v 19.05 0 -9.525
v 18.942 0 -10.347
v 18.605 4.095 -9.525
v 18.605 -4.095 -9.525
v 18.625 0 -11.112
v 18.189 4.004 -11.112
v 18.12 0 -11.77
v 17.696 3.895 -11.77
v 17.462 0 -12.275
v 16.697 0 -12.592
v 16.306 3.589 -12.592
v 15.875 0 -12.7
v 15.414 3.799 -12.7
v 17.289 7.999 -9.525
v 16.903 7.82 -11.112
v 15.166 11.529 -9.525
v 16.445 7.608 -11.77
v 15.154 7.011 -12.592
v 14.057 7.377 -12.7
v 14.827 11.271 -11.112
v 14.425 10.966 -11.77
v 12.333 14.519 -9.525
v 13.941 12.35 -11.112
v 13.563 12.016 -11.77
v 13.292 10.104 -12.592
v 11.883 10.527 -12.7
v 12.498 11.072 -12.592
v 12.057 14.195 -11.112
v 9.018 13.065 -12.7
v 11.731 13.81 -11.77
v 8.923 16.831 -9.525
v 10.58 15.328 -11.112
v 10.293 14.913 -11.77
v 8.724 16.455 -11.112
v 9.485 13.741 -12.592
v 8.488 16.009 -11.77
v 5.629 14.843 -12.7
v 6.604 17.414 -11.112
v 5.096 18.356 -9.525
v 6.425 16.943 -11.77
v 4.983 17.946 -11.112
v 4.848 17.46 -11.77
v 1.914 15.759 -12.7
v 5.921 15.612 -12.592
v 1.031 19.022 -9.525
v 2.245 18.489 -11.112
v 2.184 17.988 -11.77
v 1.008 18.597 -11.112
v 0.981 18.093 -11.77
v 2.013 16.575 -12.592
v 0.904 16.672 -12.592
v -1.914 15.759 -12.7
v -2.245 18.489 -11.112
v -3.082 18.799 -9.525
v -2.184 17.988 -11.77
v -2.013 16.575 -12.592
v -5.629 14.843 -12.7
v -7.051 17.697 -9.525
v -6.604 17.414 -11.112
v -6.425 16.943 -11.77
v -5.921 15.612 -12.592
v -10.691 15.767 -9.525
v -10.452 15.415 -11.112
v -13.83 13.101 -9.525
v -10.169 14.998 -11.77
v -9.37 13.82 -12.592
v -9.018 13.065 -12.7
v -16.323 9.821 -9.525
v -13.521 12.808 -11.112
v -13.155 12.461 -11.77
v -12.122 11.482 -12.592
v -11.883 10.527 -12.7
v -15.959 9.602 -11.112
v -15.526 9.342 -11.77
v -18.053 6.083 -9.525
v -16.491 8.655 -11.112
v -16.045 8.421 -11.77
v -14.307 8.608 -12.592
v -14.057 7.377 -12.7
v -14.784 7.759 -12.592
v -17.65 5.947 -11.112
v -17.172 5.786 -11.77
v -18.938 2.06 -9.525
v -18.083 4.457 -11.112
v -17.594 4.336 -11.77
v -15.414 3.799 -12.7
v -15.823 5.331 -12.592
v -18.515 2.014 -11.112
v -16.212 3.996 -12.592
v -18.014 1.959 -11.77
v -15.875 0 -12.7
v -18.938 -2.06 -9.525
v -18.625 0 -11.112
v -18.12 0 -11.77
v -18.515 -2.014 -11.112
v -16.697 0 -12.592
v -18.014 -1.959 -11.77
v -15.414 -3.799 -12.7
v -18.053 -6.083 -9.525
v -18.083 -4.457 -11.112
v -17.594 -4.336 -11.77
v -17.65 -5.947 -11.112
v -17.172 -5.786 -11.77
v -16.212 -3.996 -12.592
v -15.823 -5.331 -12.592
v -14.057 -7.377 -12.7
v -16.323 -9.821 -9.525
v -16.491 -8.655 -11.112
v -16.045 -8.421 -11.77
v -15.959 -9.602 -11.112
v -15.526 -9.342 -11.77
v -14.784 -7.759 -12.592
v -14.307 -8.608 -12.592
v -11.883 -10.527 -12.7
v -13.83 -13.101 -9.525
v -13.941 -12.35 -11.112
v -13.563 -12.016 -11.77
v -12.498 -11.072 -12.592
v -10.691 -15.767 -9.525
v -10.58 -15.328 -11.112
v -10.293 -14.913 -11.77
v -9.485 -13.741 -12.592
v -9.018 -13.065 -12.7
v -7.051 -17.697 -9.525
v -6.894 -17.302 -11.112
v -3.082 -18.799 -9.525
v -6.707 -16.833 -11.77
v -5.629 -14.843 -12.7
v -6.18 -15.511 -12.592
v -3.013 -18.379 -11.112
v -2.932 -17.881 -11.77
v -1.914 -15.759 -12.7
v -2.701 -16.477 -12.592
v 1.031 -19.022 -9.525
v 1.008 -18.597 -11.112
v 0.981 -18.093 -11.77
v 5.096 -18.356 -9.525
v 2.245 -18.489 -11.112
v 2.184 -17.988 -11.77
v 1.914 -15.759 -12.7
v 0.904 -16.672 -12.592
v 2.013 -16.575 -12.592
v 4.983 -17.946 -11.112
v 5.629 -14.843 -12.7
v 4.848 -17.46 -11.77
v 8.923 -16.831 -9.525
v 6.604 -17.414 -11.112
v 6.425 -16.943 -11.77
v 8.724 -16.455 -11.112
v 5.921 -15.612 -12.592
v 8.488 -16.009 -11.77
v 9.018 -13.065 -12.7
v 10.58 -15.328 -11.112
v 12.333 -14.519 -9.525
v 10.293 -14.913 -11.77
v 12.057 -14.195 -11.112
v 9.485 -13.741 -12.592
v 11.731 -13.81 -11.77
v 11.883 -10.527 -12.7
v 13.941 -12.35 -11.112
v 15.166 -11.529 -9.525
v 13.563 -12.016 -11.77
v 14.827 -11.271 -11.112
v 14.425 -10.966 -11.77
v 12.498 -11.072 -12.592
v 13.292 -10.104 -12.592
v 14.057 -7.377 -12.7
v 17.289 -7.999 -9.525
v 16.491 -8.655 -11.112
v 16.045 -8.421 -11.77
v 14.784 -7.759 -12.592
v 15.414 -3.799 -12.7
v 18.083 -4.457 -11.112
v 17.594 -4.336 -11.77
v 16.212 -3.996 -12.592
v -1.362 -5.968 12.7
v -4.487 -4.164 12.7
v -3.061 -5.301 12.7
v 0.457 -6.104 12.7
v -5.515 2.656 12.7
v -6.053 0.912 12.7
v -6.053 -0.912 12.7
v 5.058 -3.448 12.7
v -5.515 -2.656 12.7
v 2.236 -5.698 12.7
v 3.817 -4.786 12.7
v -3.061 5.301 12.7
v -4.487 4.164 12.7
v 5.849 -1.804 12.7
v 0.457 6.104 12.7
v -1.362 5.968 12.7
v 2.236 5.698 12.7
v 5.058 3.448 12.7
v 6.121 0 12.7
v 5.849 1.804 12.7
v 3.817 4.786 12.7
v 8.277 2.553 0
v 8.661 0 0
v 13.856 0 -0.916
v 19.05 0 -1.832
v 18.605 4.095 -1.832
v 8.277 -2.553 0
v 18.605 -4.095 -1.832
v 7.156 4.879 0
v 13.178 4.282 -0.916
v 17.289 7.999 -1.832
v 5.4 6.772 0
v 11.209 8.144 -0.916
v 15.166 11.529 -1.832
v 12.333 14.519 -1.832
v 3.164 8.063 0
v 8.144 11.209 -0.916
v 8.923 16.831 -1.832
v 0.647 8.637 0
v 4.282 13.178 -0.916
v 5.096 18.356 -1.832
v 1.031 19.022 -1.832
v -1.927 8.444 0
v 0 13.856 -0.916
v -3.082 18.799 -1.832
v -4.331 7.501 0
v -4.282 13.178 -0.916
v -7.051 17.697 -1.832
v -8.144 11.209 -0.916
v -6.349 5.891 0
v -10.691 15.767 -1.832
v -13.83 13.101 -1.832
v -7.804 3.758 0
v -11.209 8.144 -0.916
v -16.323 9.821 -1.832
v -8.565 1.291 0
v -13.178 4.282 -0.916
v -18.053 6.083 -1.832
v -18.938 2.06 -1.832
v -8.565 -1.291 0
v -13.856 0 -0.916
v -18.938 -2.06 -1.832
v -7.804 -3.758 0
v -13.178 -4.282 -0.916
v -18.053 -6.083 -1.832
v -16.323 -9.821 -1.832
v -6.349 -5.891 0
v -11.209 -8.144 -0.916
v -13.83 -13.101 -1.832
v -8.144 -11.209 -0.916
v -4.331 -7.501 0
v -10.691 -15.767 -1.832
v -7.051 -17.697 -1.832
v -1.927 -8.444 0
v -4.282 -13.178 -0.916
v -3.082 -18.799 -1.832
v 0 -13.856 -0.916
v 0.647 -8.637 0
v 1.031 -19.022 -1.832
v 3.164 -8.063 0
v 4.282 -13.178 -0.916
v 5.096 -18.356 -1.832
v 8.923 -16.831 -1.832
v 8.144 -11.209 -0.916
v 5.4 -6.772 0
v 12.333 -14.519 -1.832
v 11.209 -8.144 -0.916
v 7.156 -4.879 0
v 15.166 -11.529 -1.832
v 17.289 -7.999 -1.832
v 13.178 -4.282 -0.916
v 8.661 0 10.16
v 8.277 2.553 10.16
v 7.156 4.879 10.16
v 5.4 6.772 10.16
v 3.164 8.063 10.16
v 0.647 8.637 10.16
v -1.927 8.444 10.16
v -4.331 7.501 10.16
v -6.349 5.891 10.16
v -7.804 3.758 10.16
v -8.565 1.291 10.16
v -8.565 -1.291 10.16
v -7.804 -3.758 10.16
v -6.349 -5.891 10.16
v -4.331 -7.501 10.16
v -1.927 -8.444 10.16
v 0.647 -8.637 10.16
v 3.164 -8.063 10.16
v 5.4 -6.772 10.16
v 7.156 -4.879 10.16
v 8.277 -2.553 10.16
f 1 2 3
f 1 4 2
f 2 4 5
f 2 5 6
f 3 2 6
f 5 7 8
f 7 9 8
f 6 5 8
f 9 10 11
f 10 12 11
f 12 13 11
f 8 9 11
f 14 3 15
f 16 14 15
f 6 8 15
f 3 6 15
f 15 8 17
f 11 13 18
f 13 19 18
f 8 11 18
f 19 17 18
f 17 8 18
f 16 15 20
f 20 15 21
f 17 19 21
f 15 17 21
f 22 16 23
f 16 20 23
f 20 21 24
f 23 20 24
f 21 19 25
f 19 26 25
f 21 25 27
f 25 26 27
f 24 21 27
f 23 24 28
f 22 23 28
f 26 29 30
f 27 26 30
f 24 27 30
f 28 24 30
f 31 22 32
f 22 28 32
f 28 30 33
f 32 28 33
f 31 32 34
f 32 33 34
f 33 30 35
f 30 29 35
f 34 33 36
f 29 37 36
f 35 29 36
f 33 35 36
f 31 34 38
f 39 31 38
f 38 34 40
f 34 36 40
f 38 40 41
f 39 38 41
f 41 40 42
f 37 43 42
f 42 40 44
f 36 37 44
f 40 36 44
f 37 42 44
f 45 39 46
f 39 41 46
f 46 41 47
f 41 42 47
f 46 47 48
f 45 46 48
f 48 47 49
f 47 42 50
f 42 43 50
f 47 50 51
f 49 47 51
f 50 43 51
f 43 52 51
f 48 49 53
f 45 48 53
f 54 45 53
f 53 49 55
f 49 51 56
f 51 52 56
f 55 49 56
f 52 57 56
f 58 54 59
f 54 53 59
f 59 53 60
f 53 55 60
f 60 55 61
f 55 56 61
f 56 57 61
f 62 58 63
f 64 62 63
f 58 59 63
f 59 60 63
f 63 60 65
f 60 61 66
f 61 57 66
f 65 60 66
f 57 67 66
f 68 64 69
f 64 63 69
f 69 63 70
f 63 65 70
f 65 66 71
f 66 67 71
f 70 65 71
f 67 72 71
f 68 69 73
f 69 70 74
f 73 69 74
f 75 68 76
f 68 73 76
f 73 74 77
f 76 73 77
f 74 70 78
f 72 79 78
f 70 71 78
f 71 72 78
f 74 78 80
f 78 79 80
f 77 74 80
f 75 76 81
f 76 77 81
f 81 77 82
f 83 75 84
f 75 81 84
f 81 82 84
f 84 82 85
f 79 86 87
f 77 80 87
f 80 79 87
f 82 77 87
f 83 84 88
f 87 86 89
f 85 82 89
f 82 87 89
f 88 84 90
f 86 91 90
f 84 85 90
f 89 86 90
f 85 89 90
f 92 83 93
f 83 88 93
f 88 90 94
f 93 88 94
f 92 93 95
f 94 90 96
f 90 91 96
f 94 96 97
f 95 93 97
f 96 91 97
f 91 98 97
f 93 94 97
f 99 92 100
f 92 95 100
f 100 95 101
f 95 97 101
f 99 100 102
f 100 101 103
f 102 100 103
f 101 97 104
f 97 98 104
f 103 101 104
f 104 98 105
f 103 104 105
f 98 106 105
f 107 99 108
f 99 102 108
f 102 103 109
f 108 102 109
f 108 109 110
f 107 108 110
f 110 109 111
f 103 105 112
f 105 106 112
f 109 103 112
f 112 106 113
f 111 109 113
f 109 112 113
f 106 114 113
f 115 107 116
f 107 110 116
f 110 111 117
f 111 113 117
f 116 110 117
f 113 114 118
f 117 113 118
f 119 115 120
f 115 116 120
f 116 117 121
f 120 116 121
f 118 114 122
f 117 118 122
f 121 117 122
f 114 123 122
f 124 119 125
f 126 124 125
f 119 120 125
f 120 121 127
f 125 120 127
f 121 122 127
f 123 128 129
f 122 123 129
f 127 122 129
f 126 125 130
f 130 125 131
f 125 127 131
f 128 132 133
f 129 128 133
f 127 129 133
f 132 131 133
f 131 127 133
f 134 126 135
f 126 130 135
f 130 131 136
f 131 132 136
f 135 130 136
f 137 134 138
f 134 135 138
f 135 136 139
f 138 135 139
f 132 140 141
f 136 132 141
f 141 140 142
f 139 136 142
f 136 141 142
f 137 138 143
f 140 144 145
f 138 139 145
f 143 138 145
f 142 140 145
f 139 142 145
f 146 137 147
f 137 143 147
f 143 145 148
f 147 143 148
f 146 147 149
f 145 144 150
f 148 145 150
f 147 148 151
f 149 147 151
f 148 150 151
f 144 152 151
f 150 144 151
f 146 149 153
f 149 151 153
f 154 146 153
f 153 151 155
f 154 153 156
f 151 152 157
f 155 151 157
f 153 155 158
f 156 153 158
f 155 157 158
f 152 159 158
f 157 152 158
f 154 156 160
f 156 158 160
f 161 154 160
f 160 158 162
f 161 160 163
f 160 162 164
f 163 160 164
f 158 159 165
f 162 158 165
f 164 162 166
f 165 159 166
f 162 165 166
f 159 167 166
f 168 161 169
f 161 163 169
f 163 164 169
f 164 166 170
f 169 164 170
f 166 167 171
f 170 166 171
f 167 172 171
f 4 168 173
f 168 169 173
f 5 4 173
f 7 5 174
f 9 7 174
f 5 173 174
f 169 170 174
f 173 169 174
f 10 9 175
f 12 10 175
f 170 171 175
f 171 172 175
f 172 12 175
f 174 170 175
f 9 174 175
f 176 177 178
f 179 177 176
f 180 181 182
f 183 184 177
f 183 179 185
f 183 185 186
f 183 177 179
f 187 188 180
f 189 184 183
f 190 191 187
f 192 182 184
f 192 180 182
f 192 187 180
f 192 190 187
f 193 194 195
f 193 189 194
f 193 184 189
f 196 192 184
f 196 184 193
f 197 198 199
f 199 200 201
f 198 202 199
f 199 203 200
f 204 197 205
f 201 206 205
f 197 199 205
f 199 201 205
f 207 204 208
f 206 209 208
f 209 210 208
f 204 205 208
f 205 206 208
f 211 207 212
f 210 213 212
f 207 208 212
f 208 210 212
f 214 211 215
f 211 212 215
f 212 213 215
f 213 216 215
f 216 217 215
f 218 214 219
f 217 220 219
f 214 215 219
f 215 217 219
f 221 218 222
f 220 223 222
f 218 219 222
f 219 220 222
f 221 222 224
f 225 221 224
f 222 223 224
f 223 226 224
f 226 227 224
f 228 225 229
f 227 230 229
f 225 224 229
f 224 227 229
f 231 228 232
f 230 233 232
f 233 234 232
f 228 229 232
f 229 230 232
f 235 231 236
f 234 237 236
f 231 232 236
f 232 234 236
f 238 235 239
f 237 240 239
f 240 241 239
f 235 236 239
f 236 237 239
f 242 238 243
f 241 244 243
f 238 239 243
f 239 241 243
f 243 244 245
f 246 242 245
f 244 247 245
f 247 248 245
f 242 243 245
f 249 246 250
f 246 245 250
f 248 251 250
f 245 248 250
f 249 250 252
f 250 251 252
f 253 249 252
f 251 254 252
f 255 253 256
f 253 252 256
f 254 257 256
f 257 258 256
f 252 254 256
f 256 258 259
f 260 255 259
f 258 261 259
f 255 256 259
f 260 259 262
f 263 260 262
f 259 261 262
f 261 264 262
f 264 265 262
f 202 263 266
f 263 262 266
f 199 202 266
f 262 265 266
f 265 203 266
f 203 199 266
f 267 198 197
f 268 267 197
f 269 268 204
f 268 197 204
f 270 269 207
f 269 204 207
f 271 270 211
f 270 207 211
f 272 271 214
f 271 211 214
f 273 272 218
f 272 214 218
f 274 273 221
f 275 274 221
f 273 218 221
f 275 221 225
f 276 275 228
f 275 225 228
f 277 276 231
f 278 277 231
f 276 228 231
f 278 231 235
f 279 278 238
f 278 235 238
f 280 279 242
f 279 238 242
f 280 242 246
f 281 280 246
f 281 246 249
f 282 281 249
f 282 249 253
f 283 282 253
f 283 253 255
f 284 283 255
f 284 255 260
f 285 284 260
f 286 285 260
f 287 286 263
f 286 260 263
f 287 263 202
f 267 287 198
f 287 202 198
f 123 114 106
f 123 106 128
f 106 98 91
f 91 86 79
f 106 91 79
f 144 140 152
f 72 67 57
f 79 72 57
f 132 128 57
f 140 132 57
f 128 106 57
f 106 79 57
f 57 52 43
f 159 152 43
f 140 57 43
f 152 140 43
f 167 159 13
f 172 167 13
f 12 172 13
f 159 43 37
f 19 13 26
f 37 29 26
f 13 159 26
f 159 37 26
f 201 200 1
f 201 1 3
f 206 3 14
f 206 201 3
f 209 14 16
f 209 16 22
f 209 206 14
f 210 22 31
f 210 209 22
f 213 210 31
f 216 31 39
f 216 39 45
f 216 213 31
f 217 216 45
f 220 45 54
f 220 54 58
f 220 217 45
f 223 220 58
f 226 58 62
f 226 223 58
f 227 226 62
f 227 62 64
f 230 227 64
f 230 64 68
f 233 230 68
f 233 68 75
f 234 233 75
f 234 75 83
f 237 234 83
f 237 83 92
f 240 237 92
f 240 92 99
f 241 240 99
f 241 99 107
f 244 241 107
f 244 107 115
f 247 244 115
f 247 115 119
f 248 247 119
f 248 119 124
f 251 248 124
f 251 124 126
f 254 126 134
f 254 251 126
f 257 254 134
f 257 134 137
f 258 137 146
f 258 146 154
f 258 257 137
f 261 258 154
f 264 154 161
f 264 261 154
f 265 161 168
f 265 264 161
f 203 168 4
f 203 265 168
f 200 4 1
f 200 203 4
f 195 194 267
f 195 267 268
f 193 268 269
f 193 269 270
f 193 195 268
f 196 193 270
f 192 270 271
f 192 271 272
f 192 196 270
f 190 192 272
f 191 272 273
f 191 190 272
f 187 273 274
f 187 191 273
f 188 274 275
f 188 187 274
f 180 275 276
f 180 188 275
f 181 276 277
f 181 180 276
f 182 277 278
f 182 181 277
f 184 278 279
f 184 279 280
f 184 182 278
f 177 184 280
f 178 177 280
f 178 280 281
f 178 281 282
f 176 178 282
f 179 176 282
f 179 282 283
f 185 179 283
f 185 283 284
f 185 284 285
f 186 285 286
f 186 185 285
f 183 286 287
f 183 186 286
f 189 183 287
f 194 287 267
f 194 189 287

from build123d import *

# Parameters (mm, degrees)
F0_R     = 19.05
F1_DEPTH = 12.7
F2_R     = 8.6614
F3_DEPTH = 12.7
F4_SIZE  = 2.54
F7_R     = 3.175


with BuildPart() as f1:
    # F0 (on Top) → F1 (new body)
    with BuildSketch(Plane.XY):
        Circle(F0_R)
    extrude(amount=-F1_DEPTH)

    # F2 (on face) → F3 (join)
    with BuildSketch(Plane.XY):
        Circle(F2_R)
    extrude(amount=F3_DEPTH)

    # F4
    f4_edges = [f1.edges().sort_by_distance(p)[0] for p in [
        (-8.6614, 0, 12.7),
    ]]
    chamfer(f4_edges, length=F4_SIZE)

    # F5 (on Front) → F6 (revolve, cut)
    with BuildSketch(Plane.XZ):
        Polygon((19.05, -1.83179), (19.05, 0), (8.6614, 0), align=None)
    revolve(axis=Axis((0, 0, 4.455826), (0, 0, 1)), mode=Mode.SUBTRACT)

    # F7
    f7_edges = [f1.edges().sort_by_distance(p)[0] for p in [
        (-19.05, 0, -12.7),
    ]]
    fillet(f7_edges, radius=F7_R)


solid = f1.part
